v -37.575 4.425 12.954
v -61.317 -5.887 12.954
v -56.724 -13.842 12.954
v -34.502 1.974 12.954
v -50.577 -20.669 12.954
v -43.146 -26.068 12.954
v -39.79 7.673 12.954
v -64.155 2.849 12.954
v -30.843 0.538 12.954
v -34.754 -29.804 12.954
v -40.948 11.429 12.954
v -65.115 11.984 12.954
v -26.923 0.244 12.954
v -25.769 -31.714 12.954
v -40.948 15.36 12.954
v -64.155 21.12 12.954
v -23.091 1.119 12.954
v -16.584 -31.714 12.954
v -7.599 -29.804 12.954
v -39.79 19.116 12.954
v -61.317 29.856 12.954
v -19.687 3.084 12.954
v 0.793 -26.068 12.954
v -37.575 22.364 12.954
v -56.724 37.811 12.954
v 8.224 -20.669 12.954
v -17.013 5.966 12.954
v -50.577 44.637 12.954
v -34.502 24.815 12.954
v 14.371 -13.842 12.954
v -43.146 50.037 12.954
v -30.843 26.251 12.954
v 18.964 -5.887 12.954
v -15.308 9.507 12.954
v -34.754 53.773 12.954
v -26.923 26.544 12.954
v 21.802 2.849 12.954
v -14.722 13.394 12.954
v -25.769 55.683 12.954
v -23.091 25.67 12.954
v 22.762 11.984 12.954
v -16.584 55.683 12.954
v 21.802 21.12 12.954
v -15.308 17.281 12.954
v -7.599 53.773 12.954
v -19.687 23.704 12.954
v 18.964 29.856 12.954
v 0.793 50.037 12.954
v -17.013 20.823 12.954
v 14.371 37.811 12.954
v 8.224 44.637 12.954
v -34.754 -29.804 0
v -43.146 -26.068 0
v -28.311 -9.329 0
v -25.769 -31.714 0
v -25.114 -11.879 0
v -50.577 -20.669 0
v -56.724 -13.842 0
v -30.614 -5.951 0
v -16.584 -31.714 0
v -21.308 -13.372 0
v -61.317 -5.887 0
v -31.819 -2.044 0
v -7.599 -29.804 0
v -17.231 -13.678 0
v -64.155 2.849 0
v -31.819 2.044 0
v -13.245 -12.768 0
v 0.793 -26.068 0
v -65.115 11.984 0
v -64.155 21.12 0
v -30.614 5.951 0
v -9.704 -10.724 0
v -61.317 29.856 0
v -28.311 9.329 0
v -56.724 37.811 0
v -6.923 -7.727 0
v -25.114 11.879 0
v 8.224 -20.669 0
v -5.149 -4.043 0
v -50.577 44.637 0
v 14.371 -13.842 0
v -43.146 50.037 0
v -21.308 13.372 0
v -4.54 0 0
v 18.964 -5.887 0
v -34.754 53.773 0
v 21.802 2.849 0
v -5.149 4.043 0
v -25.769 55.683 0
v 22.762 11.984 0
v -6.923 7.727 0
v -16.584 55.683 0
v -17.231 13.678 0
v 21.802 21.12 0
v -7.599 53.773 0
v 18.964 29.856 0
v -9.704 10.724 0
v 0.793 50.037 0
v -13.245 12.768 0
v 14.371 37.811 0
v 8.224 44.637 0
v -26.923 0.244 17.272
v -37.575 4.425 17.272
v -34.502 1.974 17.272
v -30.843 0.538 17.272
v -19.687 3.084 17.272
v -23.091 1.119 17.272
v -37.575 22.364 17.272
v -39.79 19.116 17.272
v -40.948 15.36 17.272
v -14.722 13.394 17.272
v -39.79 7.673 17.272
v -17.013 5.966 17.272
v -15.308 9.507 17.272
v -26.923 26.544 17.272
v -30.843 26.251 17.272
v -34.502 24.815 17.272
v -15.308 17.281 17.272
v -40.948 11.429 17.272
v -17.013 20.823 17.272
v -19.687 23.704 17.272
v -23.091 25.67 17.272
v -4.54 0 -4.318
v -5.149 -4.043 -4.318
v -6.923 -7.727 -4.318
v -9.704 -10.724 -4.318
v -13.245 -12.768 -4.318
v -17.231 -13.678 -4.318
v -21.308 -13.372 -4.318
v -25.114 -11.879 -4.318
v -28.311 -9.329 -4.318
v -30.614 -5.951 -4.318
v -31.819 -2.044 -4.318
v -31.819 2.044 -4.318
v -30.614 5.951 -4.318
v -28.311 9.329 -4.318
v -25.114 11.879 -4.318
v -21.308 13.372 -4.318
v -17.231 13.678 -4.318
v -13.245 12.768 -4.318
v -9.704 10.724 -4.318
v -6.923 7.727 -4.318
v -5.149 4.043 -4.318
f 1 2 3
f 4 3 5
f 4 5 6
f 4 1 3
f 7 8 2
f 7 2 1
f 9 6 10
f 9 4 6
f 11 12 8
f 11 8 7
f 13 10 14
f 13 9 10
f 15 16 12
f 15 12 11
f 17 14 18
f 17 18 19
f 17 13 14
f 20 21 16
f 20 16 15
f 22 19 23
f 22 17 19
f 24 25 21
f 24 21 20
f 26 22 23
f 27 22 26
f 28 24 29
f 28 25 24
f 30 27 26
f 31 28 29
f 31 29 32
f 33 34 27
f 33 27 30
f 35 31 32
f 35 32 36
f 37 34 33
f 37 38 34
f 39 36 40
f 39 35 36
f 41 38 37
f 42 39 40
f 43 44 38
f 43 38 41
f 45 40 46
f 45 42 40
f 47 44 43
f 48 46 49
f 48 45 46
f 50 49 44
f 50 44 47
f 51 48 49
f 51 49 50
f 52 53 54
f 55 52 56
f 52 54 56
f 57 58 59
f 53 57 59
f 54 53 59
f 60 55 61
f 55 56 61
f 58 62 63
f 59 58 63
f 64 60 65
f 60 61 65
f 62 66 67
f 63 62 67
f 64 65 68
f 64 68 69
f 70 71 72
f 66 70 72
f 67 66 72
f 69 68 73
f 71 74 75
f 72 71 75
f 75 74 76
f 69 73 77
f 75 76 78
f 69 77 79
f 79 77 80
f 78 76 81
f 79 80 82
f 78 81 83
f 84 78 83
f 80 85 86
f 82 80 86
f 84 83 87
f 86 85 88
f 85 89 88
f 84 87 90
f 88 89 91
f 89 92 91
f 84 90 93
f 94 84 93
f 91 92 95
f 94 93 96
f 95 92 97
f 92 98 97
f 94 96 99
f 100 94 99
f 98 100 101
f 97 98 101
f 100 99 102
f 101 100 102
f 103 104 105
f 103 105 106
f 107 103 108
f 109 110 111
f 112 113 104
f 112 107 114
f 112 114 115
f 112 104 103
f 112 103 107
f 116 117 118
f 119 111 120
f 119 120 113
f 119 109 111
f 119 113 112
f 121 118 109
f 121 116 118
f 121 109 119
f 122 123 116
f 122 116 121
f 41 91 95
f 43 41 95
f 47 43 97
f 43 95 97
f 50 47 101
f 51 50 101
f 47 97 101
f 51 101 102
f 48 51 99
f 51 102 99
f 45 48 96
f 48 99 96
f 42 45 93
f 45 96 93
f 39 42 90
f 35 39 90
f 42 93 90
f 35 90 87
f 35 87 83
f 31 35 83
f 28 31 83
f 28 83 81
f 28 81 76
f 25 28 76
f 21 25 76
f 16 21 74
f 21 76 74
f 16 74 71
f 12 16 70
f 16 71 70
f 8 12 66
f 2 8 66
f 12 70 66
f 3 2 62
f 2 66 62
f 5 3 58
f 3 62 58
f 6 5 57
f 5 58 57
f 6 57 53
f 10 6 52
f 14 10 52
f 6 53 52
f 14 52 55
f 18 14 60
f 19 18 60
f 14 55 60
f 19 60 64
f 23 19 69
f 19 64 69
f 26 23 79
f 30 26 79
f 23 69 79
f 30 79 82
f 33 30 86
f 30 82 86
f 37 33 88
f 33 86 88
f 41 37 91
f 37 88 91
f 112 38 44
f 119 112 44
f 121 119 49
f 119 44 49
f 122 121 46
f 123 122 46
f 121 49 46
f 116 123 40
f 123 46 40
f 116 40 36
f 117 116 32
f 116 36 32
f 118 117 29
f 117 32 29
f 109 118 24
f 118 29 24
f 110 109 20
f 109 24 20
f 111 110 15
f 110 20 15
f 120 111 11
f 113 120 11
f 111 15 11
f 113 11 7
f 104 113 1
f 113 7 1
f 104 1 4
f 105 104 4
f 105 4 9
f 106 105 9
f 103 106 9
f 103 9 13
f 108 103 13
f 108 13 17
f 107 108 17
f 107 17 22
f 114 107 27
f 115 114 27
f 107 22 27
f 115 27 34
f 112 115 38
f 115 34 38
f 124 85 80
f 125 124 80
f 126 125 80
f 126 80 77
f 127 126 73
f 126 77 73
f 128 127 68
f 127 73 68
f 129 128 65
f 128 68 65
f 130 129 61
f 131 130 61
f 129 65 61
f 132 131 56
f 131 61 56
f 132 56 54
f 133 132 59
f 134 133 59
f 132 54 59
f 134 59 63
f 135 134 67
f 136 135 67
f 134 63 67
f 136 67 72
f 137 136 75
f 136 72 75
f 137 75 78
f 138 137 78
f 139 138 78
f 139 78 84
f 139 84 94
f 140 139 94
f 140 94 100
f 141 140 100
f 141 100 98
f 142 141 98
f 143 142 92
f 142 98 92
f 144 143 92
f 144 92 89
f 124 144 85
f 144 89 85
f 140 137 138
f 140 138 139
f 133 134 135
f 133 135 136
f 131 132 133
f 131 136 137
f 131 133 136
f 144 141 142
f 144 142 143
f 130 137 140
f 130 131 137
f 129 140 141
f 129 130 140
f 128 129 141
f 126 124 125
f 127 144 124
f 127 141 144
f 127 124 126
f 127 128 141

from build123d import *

# Parameters (mm, degrees)
F0_R     = 43.938872
F1_DEPTH = 12.954
F2_R     = 13.186842
F3_DEPTH = 4.318
F4_R     = 13.716315
F5_DEPTH = 4.318


with BuildPart() as f1:
    # F0 (on Top) → F1 (new body)
    with BuildSketch(Plane.XY):
        with Locations((-21.176565, 11.984369)):
            Circle(F0_R)
    extrude(amount=F1_DEPTH)

    # F2 (on face) → F3 (join)
    with BuildSketch(Plane.XY.offset(12.954)):
        with Locations((-27.908787, 13.394361)):
            Circle(F2_R)
    extrude(amount=F3_DEPTH)

    # F4 (on face) → F5 (join)
    with BuildSketch(Plane(origin=(0, 0, 0), x_dir=(1, 0, 0), z_dir=(0, 0, -1))):
        with Locations((-18.256115, 0)):
            Circle(F4_R)
    extrude(amount=F5_DEPTH)


solid = f1.part
